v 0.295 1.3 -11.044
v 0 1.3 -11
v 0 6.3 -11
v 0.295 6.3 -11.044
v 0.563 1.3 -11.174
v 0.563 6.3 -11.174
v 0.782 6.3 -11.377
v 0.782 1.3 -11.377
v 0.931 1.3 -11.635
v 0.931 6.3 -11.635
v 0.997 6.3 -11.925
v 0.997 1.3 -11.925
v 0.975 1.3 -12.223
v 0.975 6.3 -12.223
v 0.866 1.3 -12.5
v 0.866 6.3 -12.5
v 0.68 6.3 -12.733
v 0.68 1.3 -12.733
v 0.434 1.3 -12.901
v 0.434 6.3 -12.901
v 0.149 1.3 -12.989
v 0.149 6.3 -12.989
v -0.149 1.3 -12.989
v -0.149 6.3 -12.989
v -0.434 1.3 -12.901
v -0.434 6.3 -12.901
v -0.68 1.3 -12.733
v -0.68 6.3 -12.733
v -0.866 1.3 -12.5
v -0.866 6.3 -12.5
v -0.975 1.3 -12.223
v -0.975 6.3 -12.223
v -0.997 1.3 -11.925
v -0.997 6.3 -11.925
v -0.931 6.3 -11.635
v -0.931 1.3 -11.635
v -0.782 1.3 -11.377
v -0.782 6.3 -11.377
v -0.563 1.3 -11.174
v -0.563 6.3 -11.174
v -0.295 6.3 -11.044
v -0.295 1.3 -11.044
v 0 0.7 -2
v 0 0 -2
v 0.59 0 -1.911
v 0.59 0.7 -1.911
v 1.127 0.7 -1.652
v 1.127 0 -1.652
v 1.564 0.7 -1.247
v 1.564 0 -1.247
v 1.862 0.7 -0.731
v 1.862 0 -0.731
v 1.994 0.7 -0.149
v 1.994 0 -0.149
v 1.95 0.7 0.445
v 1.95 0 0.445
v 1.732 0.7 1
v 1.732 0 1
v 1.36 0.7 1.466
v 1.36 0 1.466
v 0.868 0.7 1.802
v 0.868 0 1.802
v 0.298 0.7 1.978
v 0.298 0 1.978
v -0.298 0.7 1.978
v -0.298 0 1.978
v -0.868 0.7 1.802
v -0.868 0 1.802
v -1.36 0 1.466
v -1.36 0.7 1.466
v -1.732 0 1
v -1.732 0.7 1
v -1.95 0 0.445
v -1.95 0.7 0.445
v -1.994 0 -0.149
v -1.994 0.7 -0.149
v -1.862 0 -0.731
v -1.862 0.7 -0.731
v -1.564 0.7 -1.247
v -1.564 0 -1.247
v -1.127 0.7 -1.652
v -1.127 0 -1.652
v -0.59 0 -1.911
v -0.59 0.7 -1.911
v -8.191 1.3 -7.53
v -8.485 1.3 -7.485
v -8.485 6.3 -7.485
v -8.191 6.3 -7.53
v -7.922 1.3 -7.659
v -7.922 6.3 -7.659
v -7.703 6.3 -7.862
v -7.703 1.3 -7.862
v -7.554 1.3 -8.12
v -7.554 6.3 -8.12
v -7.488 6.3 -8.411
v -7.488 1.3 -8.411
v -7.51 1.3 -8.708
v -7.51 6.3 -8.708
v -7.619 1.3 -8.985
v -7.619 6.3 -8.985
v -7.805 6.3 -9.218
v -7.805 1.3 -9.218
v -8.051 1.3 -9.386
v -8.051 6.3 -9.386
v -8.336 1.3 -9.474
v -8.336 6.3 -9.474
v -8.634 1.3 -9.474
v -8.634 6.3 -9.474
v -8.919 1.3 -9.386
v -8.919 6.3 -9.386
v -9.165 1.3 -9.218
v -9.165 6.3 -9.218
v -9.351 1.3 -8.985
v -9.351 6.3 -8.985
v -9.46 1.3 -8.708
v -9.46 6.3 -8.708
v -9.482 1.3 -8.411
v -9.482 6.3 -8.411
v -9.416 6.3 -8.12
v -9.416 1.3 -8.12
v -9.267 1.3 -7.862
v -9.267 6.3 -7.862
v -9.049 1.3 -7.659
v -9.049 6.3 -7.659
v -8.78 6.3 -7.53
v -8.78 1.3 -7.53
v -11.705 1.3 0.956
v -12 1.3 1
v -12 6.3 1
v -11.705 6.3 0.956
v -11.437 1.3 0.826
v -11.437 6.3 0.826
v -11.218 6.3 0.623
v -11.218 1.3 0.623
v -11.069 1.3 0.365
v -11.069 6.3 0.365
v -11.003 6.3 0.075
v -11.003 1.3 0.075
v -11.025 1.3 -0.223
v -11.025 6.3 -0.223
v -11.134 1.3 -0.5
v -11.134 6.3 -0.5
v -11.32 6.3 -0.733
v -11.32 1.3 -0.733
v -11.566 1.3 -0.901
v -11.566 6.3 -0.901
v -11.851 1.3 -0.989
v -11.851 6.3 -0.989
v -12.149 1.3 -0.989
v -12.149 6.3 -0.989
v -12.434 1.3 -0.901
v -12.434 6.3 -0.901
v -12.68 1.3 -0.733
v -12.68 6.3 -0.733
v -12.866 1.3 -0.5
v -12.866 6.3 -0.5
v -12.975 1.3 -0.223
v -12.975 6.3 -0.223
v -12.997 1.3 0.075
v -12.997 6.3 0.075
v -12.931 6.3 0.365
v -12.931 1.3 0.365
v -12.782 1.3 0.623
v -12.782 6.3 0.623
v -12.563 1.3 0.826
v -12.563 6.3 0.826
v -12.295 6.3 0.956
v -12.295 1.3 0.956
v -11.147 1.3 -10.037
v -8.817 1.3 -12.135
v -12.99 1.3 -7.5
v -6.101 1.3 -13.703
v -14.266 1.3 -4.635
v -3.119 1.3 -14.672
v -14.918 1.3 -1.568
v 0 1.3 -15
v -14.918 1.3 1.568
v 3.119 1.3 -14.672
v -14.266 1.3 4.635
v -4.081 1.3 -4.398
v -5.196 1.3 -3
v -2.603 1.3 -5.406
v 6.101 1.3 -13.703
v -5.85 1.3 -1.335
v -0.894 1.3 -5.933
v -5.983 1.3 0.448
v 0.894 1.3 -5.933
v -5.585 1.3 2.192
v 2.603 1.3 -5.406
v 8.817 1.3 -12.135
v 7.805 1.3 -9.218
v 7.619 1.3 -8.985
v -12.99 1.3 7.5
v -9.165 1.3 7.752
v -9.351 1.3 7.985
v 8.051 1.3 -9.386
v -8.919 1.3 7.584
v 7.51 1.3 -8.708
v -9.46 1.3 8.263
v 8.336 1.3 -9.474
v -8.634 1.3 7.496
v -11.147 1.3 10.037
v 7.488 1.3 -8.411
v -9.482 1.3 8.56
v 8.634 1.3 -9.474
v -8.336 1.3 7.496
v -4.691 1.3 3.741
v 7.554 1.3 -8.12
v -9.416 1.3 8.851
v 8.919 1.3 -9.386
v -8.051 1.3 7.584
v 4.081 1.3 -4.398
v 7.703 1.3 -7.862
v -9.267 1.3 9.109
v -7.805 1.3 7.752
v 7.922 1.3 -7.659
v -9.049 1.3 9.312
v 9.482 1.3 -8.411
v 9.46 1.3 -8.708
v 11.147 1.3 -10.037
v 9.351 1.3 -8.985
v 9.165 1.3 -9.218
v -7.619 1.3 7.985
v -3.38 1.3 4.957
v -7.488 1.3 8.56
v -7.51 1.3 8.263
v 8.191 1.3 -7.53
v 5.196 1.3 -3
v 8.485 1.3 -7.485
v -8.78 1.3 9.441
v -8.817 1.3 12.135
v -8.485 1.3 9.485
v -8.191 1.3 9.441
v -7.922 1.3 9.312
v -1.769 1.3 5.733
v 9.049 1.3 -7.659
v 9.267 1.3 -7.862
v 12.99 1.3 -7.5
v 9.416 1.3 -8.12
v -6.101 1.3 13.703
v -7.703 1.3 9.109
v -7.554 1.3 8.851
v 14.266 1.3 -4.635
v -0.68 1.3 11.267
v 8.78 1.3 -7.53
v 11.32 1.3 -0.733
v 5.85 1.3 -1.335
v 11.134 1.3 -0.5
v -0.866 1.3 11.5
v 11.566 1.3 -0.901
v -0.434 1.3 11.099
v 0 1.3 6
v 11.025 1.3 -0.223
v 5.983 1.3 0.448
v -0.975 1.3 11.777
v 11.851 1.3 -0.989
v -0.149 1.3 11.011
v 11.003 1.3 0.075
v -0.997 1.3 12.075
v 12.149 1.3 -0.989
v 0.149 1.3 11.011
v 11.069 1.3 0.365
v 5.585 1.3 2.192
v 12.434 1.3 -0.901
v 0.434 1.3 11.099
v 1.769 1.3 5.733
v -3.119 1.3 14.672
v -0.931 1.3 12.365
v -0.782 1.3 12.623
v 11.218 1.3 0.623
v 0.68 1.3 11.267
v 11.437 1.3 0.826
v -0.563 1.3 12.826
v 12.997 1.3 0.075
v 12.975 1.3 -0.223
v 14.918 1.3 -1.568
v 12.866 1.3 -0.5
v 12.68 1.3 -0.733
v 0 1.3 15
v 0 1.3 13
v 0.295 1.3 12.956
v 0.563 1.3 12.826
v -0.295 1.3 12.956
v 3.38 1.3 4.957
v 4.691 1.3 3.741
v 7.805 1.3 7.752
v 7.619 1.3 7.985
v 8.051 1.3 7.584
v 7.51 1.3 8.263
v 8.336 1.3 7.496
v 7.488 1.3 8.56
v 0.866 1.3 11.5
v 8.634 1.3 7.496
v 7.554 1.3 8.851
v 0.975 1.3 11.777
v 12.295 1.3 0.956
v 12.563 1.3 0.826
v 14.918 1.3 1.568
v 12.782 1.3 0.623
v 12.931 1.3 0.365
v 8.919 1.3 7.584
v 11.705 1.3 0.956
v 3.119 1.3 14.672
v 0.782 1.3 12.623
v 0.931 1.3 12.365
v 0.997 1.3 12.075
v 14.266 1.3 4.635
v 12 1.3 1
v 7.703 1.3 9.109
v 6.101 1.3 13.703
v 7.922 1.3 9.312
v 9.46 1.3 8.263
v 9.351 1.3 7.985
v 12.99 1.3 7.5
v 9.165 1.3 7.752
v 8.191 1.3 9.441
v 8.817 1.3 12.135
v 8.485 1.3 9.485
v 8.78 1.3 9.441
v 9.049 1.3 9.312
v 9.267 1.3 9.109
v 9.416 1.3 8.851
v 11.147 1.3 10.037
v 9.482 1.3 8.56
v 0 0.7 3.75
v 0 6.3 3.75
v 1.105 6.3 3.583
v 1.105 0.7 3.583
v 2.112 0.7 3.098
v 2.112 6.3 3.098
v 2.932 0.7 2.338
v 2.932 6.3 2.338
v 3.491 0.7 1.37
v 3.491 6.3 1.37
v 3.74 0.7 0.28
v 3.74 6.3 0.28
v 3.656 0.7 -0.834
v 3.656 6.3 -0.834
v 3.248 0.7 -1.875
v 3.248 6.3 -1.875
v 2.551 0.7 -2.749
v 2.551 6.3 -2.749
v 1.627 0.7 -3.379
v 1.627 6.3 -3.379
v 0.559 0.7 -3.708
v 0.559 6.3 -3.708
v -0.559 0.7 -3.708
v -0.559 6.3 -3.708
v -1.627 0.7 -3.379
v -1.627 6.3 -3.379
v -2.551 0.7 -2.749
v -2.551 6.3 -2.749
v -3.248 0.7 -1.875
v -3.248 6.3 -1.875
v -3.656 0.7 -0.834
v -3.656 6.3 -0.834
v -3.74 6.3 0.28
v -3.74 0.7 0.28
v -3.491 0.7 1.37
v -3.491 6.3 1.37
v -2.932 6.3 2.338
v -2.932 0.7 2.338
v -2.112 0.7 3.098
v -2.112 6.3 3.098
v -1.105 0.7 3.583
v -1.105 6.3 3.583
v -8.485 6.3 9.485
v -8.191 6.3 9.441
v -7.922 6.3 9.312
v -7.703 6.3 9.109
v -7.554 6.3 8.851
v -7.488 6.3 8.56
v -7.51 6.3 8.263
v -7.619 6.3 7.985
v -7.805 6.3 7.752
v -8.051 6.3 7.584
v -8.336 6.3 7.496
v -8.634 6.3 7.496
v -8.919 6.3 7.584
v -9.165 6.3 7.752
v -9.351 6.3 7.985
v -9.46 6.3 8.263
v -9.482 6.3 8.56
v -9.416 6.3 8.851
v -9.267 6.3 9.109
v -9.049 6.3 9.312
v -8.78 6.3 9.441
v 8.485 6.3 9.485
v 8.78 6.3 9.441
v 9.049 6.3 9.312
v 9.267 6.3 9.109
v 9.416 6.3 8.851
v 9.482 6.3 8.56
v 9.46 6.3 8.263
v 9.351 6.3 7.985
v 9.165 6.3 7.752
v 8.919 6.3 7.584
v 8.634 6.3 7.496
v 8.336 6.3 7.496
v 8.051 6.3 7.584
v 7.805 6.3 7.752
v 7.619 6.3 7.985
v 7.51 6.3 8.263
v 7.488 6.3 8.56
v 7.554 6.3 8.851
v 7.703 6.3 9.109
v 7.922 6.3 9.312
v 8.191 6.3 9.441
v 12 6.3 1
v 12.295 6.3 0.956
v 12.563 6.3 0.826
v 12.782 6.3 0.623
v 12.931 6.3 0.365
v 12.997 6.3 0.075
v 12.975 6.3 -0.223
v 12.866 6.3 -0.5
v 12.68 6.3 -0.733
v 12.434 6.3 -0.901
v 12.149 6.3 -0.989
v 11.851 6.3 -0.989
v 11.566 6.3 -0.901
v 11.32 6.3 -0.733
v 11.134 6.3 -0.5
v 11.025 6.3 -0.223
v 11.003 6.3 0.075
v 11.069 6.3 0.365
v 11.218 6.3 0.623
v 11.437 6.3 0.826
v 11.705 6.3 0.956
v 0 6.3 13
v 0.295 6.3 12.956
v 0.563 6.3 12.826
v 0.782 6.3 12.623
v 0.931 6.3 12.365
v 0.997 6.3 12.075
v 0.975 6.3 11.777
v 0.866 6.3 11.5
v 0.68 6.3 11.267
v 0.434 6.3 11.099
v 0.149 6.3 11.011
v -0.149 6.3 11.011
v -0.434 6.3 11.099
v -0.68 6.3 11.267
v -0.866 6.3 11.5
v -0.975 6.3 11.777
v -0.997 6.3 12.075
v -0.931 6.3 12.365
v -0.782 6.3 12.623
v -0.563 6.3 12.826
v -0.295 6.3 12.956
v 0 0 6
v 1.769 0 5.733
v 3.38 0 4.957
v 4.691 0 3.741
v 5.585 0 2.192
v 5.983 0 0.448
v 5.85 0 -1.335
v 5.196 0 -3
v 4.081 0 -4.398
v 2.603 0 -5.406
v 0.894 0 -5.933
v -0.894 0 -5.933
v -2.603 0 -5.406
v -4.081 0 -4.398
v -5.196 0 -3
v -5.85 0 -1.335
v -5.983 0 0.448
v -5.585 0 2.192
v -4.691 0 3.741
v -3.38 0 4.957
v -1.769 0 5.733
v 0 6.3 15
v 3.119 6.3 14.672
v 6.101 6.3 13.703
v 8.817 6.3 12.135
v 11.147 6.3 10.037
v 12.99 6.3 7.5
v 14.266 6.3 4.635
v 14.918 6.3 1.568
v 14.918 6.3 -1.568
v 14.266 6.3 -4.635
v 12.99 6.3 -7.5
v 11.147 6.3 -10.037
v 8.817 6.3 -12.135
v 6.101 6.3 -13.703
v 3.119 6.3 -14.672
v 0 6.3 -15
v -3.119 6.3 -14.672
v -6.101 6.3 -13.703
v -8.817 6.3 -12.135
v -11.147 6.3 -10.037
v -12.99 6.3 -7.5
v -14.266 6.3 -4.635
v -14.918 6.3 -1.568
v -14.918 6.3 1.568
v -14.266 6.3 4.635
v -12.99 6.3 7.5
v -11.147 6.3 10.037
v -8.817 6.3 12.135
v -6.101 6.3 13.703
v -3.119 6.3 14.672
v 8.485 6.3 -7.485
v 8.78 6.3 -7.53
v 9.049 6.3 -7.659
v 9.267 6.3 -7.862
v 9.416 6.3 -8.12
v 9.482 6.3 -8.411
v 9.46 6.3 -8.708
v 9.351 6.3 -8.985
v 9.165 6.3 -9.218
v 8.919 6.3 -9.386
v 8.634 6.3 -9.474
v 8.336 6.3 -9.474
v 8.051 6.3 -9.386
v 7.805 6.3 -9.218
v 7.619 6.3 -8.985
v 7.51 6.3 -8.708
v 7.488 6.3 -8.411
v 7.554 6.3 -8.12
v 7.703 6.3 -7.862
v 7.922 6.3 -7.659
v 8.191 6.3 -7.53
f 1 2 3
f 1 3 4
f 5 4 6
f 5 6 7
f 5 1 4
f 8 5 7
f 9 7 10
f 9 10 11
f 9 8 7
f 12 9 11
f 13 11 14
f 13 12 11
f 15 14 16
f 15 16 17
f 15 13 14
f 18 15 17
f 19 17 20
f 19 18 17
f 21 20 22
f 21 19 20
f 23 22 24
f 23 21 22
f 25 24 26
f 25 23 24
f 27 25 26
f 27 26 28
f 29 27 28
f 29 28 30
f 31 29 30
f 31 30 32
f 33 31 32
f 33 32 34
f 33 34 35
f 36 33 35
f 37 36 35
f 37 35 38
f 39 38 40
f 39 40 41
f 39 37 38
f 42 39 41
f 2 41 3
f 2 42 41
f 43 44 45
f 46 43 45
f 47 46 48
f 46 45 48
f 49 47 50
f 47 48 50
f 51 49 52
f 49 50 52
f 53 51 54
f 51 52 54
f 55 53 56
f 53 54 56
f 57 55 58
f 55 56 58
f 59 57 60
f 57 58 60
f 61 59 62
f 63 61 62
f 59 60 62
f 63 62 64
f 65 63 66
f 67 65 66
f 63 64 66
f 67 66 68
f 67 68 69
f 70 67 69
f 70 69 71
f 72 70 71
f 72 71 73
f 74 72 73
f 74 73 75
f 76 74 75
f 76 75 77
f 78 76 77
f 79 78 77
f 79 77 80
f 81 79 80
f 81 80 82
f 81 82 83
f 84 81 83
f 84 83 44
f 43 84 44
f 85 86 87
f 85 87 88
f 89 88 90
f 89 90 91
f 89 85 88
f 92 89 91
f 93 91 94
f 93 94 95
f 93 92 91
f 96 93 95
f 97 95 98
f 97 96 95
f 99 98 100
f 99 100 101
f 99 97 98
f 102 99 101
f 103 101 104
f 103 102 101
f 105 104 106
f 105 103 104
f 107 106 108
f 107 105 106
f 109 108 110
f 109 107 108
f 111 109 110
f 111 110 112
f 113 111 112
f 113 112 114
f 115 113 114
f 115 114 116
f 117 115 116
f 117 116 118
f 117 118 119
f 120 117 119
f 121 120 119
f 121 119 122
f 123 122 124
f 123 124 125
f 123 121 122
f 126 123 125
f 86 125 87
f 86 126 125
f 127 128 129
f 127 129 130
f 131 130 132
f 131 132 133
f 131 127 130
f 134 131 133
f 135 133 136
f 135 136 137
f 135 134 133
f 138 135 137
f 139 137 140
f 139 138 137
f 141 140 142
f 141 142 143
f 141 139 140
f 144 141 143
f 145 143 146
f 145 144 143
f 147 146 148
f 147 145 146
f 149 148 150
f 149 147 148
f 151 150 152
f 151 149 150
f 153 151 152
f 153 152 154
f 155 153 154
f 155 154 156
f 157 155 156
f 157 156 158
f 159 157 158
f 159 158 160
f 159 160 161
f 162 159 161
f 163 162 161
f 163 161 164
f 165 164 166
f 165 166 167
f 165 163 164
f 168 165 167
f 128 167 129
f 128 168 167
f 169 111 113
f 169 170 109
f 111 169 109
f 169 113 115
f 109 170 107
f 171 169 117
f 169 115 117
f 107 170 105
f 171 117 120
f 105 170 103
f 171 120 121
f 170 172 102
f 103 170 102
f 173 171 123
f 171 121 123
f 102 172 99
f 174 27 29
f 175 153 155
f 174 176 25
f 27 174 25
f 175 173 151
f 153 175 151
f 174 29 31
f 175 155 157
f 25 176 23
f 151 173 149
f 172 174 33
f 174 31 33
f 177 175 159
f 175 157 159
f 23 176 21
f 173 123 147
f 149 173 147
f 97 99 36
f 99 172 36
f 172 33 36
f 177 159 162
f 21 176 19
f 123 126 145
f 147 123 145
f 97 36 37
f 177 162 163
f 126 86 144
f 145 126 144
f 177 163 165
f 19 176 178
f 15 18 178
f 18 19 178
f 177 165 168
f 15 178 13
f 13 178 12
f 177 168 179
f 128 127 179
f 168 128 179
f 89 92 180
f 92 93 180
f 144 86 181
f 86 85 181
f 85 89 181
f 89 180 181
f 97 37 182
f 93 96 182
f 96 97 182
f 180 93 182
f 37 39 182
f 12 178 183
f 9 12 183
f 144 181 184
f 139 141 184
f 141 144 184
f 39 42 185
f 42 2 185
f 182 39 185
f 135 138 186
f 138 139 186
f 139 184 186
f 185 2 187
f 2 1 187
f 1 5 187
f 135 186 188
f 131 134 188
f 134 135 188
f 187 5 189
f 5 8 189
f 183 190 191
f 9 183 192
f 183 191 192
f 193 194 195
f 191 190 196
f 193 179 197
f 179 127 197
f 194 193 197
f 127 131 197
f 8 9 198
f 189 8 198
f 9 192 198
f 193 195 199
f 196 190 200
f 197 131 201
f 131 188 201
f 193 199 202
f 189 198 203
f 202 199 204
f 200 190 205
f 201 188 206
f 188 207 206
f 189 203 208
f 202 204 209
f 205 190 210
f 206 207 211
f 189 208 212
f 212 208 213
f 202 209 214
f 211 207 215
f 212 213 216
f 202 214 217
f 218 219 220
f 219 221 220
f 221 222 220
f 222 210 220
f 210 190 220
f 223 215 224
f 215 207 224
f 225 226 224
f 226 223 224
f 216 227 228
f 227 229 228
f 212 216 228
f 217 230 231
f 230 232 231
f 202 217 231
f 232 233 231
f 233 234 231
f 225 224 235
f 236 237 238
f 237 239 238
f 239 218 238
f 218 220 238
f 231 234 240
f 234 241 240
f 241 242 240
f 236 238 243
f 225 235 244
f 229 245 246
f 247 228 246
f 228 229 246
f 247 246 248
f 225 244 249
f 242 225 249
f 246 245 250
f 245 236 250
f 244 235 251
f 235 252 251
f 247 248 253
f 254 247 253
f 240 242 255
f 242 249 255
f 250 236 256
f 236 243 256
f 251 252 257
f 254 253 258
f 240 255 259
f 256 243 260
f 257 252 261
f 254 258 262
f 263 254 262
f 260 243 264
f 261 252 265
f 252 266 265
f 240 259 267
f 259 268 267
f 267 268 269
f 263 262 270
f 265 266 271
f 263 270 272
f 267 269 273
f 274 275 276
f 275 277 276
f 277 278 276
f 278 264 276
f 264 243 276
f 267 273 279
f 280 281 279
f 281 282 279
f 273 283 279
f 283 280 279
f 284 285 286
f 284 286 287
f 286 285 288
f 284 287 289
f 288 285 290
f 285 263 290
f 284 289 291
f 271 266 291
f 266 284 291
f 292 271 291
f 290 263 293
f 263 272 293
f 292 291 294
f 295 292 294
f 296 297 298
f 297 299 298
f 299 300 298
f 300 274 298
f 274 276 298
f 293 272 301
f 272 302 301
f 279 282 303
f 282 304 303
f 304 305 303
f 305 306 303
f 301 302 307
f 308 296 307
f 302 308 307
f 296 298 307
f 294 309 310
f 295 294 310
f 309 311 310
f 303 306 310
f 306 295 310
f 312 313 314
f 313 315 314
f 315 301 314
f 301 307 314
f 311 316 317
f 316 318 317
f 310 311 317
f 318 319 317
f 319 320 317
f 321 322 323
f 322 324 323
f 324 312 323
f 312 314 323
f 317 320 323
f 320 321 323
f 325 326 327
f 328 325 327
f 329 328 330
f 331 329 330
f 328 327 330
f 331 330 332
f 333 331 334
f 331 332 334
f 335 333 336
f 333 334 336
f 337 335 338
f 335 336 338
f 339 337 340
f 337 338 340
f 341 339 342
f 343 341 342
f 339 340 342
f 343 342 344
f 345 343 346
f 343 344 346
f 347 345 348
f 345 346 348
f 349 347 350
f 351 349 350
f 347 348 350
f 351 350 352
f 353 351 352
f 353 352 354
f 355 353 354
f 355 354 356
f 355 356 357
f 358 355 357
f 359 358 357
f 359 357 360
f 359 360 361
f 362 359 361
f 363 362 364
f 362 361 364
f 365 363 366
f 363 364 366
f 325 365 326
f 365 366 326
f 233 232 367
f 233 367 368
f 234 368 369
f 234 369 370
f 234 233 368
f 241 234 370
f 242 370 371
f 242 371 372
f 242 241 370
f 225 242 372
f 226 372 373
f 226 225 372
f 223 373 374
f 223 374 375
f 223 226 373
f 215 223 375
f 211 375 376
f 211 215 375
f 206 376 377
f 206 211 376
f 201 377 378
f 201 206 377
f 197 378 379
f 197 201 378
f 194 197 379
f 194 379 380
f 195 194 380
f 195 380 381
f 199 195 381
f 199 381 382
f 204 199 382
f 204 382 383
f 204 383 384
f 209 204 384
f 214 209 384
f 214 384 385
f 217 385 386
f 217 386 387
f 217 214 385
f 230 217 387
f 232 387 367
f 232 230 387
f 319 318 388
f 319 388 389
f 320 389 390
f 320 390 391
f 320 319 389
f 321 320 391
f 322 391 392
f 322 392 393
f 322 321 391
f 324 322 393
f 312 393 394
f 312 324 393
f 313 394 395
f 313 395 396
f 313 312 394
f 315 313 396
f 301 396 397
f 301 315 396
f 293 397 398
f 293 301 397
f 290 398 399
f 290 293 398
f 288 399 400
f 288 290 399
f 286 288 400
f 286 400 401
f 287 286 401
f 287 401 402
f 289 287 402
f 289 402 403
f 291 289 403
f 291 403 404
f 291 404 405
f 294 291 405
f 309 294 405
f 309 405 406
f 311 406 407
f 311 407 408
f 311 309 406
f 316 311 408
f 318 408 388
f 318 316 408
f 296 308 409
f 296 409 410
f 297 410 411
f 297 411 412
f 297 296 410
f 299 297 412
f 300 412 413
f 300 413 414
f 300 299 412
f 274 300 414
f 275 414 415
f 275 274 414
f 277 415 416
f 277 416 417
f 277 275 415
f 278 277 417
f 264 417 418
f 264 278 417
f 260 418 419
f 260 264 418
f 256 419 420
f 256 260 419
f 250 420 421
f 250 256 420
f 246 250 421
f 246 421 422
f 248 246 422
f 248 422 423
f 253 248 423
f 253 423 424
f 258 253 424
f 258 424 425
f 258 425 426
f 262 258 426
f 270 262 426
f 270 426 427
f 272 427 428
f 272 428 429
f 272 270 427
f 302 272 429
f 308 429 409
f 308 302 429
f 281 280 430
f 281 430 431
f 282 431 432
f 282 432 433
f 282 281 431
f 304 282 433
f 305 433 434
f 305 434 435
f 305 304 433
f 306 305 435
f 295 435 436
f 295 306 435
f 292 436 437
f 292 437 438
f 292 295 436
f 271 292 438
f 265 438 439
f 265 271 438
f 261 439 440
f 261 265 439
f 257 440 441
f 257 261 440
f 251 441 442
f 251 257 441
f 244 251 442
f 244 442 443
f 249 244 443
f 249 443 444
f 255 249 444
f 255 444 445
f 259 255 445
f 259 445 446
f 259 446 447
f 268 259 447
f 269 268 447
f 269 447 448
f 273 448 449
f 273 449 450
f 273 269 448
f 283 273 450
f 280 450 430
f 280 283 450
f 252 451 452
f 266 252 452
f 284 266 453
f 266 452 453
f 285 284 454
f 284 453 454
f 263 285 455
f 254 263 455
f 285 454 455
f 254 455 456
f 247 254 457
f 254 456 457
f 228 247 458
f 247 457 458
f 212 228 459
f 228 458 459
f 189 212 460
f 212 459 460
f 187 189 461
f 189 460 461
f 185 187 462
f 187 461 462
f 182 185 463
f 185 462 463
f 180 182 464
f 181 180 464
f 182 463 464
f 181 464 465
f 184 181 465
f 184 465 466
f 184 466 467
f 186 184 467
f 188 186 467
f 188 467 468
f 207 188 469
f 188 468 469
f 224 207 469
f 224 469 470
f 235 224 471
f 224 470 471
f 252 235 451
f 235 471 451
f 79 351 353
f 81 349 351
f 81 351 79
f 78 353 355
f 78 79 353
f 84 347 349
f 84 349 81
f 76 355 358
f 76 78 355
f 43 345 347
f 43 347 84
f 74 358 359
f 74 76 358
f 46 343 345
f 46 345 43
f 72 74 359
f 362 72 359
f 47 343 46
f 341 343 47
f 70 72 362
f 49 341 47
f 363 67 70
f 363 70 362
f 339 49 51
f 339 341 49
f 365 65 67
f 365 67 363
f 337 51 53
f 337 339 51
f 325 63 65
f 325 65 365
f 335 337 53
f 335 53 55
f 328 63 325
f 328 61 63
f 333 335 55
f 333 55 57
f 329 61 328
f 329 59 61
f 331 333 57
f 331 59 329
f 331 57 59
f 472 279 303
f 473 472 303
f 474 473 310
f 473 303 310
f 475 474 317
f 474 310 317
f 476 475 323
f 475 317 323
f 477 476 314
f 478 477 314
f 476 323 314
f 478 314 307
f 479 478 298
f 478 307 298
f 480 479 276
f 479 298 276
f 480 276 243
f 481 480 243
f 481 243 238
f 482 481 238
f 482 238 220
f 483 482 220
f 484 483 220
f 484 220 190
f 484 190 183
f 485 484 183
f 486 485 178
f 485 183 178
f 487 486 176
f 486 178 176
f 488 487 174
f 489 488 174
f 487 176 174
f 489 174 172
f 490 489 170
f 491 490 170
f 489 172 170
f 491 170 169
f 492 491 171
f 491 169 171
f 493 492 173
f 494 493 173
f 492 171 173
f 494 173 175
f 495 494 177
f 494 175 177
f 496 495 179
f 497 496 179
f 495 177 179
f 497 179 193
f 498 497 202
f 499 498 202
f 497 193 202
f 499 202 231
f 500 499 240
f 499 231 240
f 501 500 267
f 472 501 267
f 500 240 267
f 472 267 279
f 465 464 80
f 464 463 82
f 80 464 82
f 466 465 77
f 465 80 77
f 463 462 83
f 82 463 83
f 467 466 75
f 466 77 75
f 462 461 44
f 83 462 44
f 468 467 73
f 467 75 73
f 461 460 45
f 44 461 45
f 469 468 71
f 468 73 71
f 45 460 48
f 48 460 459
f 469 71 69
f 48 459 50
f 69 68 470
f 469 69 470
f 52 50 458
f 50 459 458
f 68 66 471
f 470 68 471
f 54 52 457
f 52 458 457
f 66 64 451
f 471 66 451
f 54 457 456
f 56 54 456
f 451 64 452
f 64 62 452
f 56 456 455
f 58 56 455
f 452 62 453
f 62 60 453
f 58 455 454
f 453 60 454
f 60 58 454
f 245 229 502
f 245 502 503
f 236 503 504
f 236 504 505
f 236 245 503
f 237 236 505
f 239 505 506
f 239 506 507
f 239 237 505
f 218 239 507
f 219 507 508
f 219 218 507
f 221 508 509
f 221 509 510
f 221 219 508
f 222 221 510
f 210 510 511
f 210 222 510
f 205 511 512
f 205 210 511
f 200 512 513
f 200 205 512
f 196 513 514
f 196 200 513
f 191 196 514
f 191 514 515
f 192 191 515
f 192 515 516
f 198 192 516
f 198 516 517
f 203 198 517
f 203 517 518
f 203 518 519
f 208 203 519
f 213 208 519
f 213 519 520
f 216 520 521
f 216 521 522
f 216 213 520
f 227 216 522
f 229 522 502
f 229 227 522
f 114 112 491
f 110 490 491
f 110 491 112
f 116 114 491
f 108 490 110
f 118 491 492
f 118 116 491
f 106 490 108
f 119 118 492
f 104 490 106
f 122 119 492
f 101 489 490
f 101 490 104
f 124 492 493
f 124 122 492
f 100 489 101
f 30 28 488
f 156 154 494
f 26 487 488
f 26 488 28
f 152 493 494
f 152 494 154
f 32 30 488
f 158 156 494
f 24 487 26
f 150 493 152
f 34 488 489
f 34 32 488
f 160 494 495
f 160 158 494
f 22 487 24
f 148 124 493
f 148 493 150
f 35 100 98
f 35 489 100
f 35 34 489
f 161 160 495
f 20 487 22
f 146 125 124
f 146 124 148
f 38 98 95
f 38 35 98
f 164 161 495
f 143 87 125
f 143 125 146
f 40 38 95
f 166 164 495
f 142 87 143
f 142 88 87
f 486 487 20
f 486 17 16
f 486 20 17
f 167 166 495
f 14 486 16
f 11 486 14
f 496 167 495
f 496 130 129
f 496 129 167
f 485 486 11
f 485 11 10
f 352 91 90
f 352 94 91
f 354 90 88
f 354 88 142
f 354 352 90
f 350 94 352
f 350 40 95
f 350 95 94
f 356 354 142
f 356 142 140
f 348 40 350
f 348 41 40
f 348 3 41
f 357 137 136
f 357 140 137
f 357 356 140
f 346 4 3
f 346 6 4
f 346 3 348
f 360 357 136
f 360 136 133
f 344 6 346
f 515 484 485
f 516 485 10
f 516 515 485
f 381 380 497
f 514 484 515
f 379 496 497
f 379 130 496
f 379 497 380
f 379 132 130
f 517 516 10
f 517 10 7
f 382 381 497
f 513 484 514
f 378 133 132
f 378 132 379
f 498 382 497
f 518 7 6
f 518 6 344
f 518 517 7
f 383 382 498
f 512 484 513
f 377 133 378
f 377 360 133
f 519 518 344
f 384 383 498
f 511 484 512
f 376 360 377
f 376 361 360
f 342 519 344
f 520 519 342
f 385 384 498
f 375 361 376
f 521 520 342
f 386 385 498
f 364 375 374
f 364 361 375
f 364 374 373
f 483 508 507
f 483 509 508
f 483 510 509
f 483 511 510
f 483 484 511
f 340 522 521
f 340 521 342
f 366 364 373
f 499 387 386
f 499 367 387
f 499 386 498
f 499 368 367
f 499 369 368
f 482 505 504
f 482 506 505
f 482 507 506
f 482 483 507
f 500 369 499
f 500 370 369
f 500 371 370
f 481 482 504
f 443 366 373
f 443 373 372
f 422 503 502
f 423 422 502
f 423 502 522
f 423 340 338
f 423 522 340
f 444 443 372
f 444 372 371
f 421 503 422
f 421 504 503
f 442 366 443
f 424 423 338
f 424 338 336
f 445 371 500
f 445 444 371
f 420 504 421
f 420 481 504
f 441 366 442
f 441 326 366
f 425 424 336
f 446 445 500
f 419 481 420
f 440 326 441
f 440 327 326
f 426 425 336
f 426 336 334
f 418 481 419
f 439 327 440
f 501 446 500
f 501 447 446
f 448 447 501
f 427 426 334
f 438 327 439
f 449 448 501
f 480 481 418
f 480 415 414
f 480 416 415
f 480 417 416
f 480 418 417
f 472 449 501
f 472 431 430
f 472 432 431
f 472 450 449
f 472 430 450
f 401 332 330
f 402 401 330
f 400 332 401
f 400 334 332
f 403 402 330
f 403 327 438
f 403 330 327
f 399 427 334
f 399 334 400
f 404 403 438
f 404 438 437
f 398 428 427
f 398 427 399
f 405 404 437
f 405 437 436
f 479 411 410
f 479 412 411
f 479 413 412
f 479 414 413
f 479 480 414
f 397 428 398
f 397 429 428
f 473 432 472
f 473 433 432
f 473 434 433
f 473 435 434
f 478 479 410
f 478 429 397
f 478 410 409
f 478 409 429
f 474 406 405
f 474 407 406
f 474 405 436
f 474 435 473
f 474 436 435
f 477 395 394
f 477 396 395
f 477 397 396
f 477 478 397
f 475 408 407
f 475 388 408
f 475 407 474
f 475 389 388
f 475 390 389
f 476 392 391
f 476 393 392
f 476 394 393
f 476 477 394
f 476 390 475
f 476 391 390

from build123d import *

# Parameters (mm, degrees)
SKETCH1_R           = 6
BOSS_EXTRUDE1_DEPTH = 1.3
SKETCH2_R           = 15
SKETCH2_R_2         = 1
BOSS_EXTRUDE2_DEPTH = 5
SKETCH3_R           = 2
CUT_EXTRUDE1_DEPTH  = 23.128940327
SKETCH4_R           = 3.75
CUT_EXTRUDE2_DEPTH  = 5.6


with BuildPart() as part:
    # Sketch1 → Boss-Extrude1 (new body)
    with BuildSketch(Plane(origin=(0, 0, 0), x_dir=(1, 0, 0), z_dir=(0, 1, 0))):
        with Locations(Location((0, 0, 0), (0, 0, 270))):
            Circle(SKETCH1_R)
    extrude(amount=BOSS_EXTRUDE1_DEPTH)

    # Sketch2 → Boss-Extrude2 (add)
    with BuildSketch(Plane(origin=(0, 1.3, 0), x_dir=(1, 0, 0), z_dir=(0, 1, 0))):
        with Locations(Location((0, 0, 0), (0, 0, 270))):
            Circle(SKETCH2_R)
        with Locations(Location((0, 12, 0), (0, 0, 270))):
            Circle(SKETCH2_R_2, mode=Mode.SUBTRACT)
        with Locations(Location((8.485281374, 8.485281374, 0), (0, 0, 270))):
            Circle(SKETCH2_R_2, mode=Mode.SUBTRACT)
        with Locations(Location((12, 0, 0), (0, 0, 270))):
            Circle(SKETCH2_R_2, mode=Mode.SUBTRACT)
        with Locations(Location((8.485281374, -8.485281374, 0), (0, 0, 270))):
            Circle(SKETCH2_R_2, mode=Mode.SUBTRACT)
        with Locations(Location((0, -12, 0), (0, 0, 270))):
            Circle(SKETCH2_R_2, mode=Mode.SUBTRACT)
        with Locations(Location((-8.485281374, -8.485281374, 0), (0, 0, 270))):
            Circle(SKETCH2_R_2, mode=Mode.SUBTRACT)
        with Locations(Location((-12, 0, 0), (0, 0, 270))):
            Circle(SKETCH2_R_2, mode=Mode.SUBTRACT)
        with Locations(Location((-8.485281374, 8.485281374, 0), (0, 0, 270))):
            Circle(SKETCH2_R_2, mode=Mode.SUBTRACT)
    extrude(amount=BOSS_EXTRUDE2_DEPTH)

    # Sketch3 → Cut-Extrude1 (cut, through all)
    with BuildSketch(Plane.XZ):
        with Locations(Location((0, 0, 0), (0, 0, 270))):
            Circle(SKETCH3_R)
    extrude(amount=-CUT_EXTRUDE1_DEPTH, mode=Mode.SUBTRACT)

    # Sketch4 → Cut-Extrude2 (cut)
    with BuildSketch(Plane(origin=(0, 6.3, 0), x_dir=(1, 0, 0), z_dir=(0, 1, 0))):
        with Locations(Location((0, 0, 0), (0, 0, 270))):
            Circle(SKETCH4_R)
    extrude(amount=-CUT_EXTRUDE2_DEPTH, mode=Mode.SUBTRACT)


solid = part.part
